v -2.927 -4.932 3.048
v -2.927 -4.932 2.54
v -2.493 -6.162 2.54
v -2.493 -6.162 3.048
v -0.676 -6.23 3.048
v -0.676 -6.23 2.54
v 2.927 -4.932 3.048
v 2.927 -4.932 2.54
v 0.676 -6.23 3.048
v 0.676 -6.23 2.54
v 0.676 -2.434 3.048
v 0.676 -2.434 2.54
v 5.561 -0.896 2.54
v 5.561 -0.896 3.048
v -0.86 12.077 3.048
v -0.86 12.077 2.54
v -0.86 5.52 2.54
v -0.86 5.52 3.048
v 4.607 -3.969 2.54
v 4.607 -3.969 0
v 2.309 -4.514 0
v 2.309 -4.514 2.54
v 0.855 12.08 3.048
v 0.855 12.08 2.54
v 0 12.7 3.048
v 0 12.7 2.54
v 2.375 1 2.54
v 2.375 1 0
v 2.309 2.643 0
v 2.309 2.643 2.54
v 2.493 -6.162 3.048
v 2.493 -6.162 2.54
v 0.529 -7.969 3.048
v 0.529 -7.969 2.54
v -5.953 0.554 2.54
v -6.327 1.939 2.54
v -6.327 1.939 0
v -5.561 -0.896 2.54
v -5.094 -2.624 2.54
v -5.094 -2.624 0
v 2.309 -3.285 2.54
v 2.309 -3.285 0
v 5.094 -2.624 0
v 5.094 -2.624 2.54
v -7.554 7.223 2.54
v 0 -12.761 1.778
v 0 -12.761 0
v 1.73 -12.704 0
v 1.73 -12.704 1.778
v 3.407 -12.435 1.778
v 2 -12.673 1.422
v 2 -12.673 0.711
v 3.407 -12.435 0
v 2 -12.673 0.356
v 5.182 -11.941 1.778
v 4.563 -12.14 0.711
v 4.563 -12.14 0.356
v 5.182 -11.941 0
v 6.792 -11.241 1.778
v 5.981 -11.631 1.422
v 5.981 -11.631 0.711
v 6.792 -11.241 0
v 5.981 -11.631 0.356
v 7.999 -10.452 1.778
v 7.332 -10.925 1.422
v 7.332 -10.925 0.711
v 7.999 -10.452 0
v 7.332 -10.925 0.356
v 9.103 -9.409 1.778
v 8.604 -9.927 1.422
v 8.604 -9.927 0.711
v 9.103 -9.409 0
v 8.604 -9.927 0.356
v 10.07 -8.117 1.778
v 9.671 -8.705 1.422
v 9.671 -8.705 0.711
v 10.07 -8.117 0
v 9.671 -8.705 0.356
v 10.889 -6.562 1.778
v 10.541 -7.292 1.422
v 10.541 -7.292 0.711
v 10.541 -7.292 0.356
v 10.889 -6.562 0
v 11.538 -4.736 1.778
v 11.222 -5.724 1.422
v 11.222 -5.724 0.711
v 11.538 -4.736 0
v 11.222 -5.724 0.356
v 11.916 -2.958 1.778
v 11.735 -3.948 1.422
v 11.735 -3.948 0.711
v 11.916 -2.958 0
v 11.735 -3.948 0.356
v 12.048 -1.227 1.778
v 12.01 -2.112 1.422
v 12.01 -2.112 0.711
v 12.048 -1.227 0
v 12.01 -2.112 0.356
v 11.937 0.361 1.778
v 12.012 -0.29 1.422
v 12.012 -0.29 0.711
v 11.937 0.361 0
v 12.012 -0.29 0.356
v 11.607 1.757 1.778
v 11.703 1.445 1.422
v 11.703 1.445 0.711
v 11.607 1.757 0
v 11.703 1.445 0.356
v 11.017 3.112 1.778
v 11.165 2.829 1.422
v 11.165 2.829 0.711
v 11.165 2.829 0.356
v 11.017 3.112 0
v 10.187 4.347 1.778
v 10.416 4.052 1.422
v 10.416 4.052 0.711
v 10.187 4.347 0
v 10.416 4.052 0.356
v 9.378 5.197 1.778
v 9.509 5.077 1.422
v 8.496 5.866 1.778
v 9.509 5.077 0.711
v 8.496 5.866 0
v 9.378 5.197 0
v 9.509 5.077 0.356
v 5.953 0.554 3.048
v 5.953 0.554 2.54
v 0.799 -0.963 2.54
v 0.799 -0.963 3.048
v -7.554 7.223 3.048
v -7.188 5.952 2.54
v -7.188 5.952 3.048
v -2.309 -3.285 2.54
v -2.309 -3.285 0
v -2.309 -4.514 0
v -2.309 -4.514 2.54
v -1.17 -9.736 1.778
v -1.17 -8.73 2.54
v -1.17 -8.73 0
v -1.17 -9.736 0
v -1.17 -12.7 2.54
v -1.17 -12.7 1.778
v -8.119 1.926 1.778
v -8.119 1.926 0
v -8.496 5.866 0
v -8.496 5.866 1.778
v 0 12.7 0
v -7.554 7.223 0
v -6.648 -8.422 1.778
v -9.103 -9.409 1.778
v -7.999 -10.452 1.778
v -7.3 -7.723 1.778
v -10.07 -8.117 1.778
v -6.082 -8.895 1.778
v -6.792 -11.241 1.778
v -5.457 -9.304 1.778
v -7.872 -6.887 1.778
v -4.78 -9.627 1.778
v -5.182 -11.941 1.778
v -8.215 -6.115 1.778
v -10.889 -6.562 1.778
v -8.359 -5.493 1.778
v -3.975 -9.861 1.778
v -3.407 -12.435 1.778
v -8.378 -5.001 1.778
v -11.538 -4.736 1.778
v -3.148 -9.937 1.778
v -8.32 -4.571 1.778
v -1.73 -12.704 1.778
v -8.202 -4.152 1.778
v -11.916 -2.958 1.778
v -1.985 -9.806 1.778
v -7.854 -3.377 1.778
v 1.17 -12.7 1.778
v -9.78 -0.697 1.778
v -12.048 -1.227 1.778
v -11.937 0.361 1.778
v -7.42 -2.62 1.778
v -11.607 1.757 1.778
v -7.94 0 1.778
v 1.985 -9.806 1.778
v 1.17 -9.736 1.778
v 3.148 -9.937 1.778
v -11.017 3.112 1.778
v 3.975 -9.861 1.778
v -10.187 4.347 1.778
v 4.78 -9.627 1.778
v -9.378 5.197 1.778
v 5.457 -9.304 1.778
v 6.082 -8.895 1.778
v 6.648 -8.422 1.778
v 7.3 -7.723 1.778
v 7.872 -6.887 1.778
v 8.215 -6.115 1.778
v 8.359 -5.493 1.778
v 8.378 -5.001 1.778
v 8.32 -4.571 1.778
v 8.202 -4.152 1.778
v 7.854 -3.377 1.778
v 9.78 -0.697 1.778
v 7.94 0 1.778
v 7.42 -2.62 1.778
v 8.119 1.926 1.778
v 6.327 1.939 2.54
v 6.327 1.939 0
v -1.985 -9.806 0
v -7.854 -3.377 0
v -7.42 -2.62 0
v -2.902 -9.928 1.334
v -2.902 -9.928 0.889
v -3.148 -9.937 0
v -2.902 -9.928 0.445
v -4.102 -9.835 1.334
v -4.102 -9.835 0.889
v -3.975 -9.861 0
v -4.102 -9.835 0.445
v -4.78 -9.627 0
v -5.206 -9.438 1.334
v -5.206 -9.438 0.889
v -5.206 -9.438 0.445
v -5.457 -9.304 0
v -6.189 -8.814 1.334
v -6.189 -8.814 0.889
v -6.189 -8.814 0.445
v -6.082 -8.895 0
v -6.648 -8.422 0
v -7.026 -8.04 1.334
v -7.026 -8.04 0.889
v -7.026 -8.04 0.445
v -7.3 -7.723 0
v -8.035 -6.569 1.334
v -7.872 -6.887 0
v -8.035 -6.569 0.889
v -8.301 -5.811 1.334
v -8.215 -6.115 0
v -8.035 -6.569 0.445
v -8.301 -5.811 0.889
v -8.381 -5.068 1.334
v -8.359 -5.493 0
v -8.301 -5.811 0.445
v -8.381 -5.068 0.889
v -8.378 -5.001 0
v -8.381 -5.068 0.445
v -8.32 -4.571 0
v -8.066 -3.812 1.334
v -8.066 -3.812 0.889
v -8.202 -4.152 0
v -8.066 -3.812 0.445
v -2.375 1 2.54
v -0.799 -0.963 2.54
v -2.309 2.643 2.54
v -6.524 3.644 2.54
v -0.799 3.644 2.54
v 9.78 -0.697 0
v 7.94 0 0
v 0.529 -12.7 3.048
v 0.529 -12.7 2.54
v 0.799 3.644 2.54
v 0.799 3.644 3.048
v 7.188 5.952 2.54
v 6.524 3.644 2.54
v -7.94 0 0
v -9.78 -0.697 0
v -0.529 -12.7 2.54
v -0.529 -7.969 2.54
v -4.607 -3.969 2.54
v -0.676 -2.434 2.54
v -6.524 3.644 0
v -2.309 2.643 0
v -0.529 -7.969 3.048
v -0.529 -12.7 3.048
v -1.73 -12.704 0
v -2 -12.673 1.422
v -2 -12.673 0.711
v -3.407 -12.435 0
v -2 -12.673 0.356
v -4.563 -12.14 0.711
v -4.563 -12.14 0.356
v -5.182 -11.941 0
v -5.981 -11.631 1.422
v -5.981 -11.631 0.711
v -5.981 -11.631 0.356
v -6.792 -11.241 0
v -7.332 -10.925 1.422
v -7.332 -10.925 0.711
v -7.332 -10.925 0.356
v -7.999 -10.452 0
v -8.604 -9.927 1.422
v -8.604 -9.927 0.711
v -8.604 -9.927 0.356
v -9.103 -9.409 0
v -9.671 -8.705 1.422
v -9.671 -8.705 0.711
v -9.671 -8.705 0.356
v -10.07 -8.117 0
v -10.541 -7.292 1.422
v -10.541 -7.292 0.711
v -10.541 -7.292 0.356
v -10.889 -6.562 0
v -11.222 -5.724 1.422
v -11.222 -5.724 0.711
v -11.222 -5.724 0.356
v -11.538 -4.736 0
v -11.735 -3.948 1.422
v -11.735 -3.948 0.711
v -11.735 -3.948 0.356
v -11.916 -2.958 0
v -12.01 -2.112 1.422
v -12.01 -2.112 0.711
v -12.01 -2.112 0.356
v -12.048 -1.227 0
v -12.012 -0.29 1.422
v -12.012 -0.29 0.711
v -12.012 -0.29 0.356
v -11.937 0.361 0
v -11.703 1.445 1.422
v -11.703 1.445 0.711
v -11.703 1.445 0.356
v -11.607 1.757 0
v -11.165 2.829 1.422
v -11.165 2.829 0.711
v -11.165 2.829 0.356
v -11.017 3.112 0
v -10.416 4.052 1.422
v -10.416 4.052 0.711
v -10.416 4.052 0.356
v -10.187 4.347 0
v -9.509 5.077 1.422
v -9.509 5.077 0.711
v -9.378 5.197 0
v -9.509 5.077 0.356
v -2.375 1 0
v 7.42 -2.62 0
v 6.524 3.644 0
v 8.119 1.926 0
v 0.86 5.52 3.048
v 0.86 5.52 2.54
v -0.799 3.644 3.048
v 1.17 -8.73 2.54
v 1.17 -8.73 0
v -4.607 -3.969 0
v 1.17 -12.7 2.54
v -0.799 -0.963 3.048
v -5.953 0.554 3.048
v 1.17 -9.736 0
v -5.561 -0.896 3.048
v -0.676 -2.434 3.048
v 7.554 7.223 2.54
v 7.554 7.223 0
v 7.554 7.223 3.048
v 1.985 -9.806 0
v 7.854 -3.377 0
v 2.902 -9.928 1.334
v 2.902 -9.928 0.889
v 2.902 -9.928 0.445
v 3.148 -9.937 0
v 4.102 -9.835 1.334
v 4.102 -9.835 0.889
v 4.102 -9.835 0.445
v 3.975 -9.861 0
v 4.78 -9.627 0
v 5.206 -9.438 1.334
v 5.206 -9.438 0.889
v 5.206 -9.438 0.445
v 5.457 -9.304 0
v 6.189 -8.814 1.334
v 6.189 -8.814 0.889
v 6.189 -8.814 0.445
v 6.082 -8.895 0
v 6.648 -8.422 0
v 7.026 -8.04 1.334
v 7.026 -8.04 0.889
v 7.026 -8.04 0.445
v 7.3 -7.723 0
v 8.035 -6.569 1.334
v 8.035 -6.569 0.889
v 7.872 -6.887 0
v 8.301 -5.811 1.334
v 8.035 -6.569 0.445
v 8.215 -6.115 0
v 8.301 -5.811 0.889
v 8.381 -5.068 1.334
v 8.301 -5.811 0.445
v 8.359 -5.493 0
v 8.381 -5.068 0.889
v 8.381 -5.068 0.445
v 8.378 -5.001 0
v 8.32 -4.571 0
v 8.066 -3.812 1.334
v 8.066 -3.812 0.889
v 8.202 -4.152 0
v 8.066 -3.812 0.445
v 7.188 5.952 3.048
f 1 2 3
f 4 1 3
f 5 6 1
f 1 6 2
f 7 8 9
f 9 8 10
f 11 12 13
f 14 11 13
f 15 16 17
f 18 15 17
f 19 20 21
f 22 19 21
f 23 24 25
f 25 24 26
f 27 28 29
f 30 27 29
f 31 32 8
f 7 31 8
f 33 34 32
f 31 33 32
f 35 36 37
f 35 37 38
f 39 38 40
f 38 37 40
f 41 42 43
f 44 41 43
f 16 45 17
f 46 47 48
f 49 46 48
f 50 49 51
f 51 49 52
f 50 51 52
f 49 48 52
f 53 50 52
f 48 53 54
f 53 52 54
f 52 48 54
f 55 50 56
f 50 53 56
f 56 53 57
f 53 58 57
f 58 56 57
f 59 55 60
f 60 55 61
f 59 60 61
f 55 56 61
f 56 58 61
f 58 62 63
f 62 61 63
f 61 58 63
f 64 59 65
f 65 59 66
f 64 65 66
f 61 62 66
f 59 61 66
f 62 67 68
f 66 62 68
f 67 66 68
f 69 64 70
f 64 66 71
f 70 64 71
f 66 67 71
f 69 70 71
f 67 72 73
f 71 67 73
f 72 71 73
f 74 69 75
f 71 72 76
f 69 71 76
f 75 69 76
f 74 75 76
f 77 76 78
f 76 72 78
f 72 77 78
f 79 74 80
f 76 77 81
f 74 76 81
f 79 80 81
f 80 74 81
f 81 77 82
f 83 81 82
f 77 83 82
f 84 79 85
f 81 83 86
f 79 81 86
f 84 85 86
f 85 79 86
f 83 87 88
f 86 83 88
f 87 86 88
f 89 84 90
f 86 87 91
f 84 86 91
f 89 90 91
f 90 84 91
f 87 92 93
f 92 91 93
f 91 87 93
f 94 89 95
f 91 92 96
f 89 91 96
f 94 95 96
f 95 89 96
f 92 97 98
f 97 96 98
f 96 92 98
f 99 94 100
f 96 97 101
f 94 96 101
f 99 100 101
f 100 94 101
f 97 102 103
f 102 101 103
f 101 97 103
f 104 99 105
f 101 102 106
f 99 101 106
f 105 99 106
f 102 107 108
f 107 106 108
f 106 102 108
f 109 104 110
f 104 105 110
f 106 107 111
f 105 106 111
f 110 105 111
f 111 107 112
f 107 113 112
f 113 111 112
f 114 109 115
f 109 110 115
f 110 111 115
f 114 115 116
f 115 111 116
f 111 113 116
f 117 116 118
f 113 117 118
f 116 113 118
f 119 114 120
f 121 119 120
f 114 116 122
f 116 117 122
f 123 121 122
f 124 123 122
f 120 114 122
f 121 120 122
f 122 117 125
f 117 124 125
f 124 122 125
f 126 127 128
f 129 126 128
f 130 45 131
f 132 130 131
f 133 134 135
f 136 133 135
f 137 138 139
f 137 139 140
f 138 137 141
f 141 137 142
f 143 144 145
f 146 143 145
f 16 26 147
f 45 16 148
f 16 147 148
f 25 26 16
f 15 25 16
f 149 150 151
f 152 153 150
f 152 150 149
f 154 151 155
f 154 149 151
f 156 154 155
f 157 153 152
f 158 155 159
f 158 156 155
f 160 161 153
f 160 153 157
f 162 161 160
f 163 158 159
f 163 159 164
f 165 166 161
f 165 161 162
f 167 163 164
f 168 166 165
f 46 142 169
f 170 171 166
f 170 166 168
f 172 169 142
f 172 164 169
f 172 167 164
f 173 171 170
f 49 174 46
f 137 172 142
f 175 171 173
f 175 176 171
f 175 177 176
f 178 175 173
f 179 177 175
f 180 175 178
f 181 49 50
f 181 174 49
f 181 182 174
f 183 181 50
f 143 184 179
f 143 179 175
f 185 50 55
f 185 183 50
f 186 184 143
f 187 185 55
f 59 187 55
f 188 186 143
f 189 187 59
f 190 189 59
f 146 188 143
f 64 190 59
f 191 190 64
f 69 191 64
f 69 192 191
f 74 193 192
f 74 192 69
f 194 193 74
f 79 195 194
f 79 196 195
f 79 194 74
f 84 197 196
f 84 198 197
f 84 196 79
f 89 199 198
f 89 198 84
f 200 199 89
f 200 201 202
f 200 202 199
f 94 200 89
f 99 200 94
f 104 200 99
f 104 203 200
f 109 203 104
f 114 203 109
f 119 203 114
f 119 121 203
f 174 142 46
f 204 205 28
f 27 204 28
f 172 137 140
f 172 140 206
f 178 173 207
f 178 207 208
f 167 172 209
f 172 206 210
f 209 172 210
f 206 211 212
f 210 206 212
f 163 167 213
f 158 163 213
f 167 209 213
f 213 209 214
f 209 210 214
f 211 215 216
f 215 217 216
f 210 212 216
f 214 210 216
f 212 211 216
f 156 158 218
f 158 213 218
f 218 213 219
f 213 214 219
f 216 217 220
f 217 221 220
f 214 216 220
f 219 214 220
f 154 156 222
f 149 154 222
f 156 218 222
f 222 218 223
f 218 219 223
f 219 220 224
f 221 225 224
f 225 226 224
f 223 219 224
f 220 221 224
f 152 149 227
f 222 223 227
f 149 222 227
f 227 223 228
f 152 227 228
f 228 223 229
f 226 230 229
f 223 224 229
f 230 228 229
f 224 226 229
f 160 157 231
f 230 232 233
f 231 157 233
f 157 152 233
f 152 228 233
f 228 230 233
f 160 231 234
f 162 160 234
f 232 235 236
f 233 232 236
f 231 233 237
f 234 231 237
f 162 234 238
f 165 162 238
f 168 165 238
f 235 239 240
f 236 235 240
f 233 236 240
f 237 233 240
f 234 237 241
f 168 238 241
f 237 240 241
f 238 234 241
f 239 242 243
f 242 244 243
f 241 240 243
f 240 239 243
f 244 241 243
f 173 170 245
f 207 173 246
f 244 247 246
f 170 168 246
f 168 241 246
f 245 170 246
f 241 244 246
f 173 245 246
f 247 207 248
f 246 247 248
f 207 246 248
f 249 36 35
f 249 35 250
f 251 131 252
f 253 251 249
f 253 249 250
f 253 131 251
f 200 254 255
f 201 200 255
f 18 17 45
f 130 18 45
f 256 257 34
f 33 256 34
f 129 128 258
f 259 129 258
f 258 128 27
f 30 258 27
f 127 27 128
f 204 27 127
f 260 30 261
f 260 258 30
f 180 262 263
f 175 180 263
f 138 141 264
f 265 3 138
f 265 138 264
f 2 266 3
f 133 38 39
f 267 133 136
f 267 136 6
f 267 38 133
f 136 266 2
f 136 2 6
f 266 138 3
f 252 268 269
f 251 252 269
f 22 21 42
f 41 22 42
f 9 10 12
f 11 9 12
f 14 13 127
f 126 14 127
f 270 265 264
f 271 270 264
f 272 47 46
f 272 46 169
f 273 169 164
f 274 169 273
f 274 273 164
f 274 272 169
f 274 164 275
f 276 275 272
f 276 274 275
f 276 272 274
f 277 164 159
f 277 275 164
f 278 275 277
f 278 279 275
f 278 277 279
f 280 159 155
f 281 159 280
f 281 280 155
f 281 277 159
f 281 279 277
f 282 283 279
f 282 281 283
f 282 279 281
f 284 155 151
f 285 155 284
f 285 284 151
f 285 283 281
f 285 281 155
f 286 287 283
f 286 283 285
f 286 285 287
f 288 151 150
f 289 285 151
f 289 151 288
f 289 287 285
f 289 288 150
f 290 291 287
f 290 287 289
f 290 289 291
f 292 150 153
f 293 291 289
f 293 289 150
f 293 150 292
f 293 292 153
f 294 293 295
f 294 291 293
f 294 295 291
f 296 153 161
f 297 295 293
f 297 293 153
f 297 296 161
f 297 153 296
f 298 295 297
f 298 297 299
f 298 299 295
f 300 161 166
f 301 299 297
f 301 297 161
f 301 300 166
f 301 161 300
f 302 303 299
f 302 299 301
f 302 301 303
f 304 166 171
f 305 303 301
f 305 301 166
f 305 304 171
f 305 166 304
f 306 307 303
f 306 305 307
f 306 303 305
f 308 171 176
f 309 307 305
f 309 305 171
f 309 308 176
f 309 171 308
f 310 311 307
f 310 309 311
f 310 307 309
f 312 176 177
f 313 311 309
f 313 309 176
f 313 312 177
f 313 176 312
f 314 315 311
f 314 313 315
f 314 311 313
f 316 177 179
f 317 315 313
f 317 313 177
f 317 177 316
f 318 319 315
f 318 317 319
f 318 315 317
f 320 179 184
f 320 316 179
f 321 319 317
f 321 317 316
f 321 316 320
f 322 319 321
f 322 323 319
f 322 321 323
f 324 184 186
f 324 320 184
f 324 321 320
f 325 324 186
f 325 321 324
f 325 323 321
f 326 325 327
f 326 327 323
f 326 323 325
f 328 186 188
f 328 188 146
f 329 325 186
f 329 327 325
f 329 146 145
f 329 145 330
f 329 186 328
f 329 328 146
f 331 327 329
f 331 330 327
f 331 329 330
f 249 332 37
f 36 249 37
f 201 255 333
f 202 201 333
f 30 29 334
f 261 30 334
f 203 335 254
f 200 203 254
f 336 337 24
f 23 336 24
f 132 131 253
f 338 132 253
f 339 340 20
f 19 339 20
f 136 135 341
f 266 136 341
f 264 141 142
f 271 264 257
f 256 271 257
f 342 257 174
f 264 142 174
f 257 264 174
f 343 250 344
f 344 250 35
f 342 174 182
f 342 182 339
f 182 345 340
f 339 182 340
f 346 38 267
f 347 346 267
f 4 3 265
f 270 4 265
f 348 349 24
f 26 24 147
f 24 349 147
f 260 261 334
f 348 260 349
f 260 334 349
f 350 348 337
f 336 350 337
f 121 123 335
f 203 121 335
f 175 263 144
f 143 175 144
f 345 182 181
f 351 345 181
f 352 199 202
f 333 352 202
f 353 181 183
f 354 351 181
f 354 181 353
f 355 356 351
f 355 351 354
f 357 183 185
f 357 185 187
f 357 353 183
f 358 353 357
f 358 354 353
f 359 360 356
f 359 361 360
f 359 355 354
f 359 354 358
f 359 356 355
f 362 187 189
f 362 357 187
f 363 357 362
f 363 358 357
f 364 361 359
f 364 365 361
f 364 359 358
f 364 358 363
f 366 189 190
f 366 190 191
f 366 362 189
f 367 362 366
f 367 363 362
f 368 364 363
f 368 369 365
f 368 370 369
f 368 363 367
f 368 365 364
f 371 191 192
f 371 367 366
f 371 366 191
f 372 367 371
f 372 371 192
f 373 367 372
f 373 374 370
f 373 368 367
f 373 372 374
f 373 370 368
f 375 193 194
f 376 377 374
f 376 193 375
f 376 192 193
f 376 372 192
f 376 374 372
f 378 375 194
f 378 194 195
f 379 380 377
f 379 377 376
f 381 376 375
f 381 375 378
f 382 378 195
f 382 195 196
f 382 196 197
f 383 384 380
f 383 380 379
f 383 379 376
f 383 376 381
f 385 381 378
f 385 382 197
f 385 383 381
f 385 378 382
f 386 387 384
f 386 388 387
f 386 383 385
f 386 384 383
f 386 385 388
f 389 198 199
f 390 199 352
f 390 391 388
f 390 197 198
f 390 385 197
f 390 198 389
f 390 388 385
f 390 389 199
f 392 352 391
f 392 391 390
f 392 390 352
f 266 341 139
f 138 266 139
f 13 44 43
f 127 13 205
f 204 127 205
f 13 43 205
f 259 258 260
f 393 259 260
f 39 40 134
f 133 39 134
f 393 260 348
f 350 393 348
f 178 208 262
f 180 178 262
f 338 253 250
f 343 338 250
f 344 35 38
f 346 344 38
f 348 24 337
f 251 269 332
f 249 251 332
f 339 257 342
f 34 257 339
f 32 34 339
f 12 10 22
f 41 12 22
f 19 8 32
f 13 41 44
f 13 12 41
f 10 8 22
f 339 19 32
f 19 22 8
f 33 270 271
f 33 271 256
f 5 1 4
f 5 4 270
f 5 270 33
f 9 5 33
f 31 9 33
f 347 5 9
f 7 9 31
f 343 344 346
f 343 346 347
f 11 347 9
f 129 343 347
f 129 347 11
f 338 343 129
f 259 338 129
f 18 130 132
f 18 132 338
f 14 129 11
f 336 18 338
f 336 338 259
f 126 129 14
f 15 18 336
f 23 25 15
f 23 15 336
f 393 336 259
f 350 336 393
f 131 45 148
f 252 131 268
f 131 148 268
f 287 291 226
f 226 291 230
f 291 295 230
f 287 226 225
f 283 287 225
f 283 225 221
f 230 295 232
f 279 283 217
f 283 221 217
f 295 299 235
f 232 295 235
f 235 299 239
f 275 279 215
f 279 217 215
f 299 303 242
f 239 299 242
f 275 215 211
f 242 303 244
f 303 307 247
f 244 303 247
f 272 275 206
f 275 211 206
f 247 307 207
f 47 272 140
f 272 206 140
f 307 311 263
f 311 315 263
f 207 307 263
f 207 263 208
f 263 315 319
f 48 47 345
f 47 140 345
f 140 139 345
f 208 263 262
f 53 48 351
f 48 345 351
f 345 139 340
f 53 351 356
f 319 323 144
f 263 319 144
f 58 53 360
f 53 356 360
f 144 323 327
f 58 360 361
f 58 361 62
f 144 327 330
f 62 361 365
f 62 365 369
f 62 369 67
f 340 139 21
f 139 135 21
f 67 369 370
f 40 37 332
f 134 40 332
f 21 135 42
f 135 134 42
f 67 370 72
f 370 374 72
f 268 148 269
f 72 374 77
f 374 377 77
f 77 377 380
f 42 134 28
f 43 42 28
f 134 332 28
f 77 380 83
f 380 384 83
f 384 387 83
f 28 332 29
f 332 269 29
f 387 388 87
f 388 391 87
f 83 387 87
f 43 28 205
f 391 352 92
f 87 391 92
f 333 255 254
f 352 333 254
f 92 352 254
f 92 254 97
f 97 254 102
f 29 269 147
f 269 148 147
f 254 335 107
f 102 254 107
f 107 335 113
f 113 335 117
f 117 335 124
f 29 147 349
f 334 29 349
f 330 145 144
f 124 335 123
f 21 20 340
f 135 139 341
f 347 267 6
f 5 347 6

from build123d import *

# Parameters (mm, degrees)
F1_DEPTH = 2.54
F3_DEPTH = 0.508
F5_DEPTH = 1.778


with BuildPart() as f1:
    # F0 (on Top) → F1 (new body)
    with BuildSketch(Plane.XY):
        Polygon((7.5537175871, 7.222705055), (0, 12.7), (-7.5537175871, 7.222705055), (-6.5243692948, 3.6444937882), (-2.3092337336, 2.6433991272), (-2.3754354034, 1.0000162736), (-6.3273296691, 1.9385911291), (-5.0937847926, -2.6240828397), (-2.3092337336, -3.2854136933), (-2.3092337336, -4.5144362623), (-4.6072022218, -3.9686687653), (-1.1698224965, -8.7301628115), (-1.1698224965, -12.7), (0, -12.7), (1.1698224965, -12.7), (1.1698224965, -8.7301628115), (4.6072022218, -3.9686687653), (2.3092337336, -4.5144362623), (2.3092337336, -3.2854136933), (5.0937847926, -2.6240828397), (6.3273296691, 1.9385911291), (2.3754354034, 1.0000162736), (2.3092337336, 2.6433991272), (6.5243692948, 3.6444937882), align=None)
    extrude(amount=F1_DEPTH)

    # F2 (on face) → F3 (join)
    with BuildSketch(Plane.XY.offset(2.54)):
        Polygon((-0.8598621353, 5.5201994255), (-7.5537175871, 7.222705055), (-7.1881001843, 5.951749131), (-0.7990982267, 3.6444937882), (-0.7990982267, -0.9626591927), (-5.9528638441, 0.5535053454), (-5.5610737687, -0.8956599119), (-0.676086056, -2.4337439895), (-0.676086056, -6.2303695025), (-2.9274653643, -4.9321902916), (-2.4932585657, -6.1622643843), (-0.5290653789, -7.9689593986), (-0.5290653789, -12.7), (0, -12.7), (0, 12.7), (-0.8598621353, 12.0765032287), align=None)
        Polygon((0.8549828016, 12.0800412944), (0, 12.7), (0, -12.7), (0.5290653789, -12.7), (0.5290653789, -7.9689593986), (2.4932585657, -6.1622643843), (2.9274653643, -4.9321902916), (0.676086056, -6.2303695025), (0.676086056, -2.4337439895), (5.5610737687, -0.8956599119), (5.9528638441, 0.5535053454), (0.7990982267, -0.9626591927), (0.7990982267, 3.6444937882), (7.1881001843, 5.951749131), (7.5537175871, 7.222705055), (0.8598621353, 5.5201994255), align=None)
    extrude(amount=F3_DEPTH)

    # F4 (on Top) → F5 (join)
    with BuildSketch(Plane.XY):
        with BuildLine():
            Line((0, -10.949806289), (0, -12.7608785406))
            add(Edge.make_bspline(
                [(0, -12.7608785406), (0.0773443542, -11.9772860283), (0.0714068119, -11.3888440065), (0, -10.949806289)],
                knots=[0, 0, 0, 0, 0.052703674, 0.052703674, 0.052703674, 0.052703674], degree=3))
        make_face()
        with BuildLine():
            add(Edge.make_bspline(
                [(0, -12.7608785406), (-0.0773443542, -11.9772860283), (-0.0714068119, -11.3888440065), (0, -10.949806289)],
                knots=[0, 0, 0, 0, 0.052703674, 0.052703674, 0.052703674, 0.052703674], degree=3))
            Line((0, -12.7608785406), (0, -10.949806289))
        make_face()
        with BuildLine():
            add(Edge.make_bspline(
                [(0, -12.7608785406), (-0.5616742186, -12.770440741), (-2.1205421024, -12.790638617), (-7.9874049211, -11.4827046144), (-11.7723741699, -5.9537379696), (-12.5908554196, 1.5376936676), (-9.8928115736, 4.9884440795), (-8.4962220863, 5.8655152097)],
                knots=[0, 0, 0, 0, 0.1246508441, 0.3333749684, 0.5579268, 0.7940921964, 1, 1, 1, 1], degree=3))
            add(Edge.make_bspline(
                [(0, -12.7608785406), (-0.0773443542, -11.9772860283), (-0.0714068119, -11.3888440065), (0, -10.949806289)],
                knots=[0, 0, 0, 0, 0.052703674, 0.052703674, 0.052703674, 0.052703674], degree=3))
            add(Edge.make_bspline(
                [(0, -10.949806289), (-0.2888992842, -9.1735376255), (-3.443955699, -10.7255806784), (-7.2608486379, -8.3705425095), (-8.8808301689, -5.0786594093), (-7.8867861812, -3.4054211415), (-7.4195610359, -2.6202637237)],
                knots=[0.052703674, 0.052703674, 0.052703674, 0.052703674, 0.2659333829, 0.547176016, 0.7858478386, 1, 1, 1, 1], degree=3))
            Line((-7.4195610359, -2.6202637237), (-7.939890027, 0))
            Line((-7.939890027, 0), (-9.779876098, -0.6970435497))
            Line((-9.779876098, -0.6970435497), (-8.118913509, 1.92552933))
            Line((-8.118913509, 1.92552933), (-8.4962220863, 5.8655152097))
        make_face()
        with BuildLine():
            add(Edge.make_bspline(
                [(0, -12.7608785406), (0.0773443542, -11.9772860283), (0.0714068119, -11.3888440065), (0, -10.949806289)],
                knots=[0, 0, 0, 0, 0.052703674, 0.052703674, 0.052703674, 0.052703674], degree=3))
            add(Edge.make_bspline(
                [(0, -12.7608785406), (0.5616742186, -12.770440741), (2.1205421024, -12.790638617), (7.9874049211, -11.4827046144), (11.7723741699, -5.9537379696), (12.5908554196, 1.5376936676), (9.8928115736, 4.9884440795), (8.4962220863, 5.8655152097)],
                knots=[0, 0, 0, 0, 0.1246508441, 0.3333749684, 0.5579268, 0.7940921964, 1, 1, 1, 1], degree=3))
            Line((8.4962220863, 5.8655152097), (8.118913509, 1.92552933))
            Line((8.118913509, 1.92552933), (9.779876098, -0.6970435497))
            Line((9.779876098, -0.6970435497), (7.939890027, 0))
            Line((7.939890027, 0), (7.4195610359, -2.6202637237))
            add(Edge.make_bspline(
                [(0, -10.949806289), (0.2888992842, -9.1735376255), (3.443955699, -10.7255806784), (7.2608486379, -8.3705425095), (8.8808301689, -5.0786594093), (7.8867861812, -3.4054211415), (7.4195610359, -2.6202637237)],
                knots=[0.052703674, 0.052703674, 0.052703674, 0.052703674, 0.2659333829, 0.547176016, 0.7858478386, 1, 1, 1, 1], degree=3))
        make_face()
    extrude(amount=F5_DEPTH)


solid = f1.part
